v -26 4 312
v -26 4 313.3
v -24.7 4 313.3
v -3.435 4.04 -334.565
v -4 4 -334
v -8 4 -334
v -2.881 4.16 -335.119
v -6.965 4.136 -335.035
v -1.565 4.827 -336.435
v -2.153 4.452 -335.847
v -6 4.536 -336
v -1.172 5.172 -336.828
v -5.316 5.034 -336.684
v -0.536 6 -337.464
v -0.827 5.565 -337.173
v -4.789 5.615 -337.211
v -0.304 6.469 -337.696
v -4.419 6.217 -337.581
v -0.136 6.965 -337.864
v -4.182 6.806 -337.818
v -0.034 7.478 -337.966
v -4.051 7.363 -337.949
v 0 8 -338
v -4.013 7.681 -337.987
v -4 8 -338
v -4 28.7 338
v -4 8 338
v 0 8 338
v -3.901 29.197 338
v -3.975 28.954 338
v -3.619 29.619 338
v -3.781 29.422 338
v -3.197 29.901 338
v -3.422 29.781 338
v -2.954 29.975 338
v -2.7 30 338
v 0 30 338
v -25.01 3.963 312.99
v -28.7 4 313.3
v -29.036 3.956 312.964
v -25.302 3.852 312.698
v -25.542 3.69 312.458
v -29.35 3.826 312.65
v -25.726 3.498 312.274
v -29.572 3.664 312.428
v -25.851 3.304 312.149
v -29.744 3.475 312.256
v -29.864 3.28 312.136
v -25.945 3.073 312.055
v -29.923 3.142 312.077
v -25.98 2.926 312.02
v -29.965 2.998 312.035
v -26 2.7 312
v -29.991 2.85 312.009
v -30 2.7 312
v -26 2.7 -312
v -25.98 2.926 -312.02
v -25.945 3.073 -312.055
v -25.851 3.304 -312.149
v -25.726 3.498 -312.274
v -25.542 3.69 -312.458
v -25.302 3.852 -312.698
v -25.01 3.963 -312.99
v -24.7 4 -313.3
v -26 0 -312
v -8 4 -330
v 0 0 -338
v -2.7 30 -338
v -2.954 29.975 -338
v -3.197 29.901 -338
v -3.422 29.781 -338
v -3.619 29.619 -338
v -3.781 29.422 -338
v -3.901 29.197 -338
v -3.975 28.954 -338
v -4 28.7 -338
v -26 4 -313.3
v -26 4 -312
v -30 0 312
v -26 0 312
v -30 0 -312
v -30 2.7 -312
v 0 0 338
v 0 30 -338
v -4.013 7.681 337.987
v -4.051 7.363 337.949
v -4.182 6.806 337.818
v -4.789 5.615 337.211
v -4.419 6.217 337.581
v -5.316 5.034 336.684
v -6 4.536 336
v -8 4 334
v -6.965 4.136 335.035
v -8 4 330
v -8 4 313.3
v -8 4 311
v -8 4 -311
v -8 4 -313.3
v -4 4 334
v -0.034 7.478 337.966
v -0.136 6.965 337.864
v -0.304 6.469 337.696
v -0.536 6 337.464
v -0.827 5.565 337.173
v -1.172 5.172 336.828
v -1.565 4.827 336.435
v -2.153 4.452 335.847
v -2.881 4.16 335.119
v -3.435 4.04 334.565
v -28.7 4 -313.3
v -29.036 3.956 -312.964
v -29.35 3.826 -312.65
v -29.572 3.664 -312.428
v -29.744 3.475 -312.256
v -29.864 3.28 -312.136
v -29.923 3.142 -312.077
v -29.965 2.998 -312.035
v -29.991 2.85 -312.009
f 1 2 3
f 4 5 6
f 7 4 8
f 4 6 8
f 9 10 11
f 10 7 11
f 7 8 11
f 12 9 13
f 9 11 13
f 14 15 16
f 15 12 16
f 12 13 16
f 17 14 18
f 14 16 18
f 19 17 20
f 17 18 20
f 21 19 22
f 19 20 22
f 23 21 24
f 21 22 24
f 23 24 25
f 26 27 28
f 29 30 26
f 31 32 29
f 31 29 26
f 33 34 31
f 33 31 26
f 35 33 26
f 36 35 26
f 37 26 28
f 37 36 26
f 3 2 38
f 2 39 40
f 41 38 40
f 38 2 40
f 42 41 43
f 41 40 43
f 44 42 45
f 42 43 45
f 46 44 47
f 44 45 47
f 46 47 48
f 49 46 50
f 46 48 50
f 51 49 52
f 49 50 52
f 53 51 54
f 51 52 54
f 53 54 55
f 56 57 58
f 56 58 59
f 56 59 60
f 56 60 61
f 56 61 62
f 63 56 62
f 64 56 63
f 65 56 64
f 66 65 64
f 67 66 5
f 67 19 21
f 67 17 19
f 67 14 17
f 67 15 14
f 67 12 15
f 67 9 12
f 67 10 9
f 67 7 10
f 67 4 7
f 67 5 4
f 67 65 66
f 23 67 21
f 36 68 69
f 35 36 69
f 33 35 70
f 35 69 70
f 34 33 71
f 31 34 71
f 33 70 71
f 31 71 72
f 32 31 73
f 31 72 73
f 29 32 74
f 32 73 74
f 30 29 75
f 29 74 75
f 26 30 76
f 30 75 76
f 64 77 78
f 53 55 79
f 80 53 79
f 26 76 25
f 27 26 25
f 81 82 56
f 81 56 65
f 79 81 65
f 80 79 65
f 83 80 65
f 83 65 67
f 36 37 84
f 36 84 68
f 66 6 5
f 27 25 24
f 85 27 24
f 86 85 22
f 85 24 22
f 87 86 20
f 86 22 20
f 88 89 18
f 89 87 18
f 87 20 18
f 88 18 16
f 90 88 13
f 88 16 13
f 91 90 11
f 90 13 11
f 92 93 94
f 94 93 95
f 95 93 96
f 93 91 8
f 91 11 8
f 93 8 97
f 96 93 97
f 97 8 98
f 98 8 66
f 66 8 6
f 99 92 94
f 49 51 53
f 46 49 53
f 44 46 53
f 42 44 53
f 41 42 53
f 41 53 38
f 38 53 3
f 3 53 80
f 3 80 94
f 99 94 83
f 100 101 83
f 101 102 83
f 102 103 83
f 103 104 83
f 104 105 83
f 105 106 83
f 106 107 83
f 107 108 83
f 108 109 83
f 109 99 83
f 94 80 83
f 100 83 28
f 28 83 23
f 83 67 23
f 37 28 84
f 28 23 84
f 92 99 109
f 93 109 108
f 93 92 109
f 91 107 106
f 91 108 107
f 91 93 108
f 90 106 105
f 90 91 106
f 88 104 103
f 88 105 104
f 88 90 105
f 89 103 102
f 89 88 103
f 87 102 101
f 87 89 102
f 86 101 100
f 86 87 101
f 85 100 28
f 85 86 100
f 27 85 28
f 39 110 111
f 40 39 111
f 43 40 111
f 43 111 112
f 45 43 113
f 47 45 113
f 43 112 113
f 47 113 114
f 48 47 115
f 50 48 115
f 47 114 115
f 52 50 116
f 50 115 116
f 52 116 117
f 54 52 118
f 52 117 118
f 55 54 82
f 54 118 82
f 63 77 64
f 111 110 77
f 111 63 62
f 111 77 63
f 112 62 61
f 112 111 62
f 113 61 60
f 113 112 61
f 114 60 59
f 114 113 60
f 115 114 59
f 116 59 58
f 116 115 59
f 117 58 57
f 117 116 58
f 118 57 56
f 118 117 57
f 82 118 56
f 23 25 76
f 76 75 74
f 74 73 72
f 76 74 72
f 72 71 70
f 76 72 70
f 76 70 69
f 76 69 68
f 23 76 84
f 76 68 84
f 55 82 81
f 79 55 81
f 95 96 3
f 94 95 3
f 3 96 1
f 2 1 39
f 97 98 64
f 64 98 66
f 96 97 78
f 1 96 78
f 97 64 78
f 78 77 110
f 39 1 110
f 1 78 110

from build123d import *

# Parameters (mm, degrees)
EXTRUDE_1_DEPTH = 338
OTHER_START     = -31
OTHER_1_DEPTH   = 5
OTHER_START_2   = -24.7
OTHER_1_2_DEPTH = 20.7
OTHER_START_3   = -1
OTHER_1_3_DEPTH = 5
OTHER_START_4   = 4
OTHER_1_4_DEPTH = 4
OTHER_START_5   = -4
OTHER_1_5_DEPTH = 4
OTHER_START_6   = -26
OTHER_1_6_DEPTH = 18


with BuildPart() as part:
    # Эскиз1 → Бобышка-Вытянуть1 (new body)
    with BuildSketch(Plane.XY):
        with BuildLine():
            Line((0, 0), (0, 30))
            Line((0, 30), (-2.7, 30))
            ThreePointArc((-2.7, 30), (-3.619238816, 29.619238816), (-4, 28.7))
            Line((-4, 28.7), (-4, 8))
            ThreePointArc((-4, 8), (-5.171572875, 5.171572875), (-8, 4))
            Line((-8, 4), (-28.7, 4))
            ThreePointArc((-28.7, 4), (-29.619238816, 3.619238816), (-30, 2.7))
            Line((-30, 2.7), (-30, 0))
            Line((-30, 0), (0, 0))
        make_face()
    extrude(amount=-EXTRUDE_1_DEPTH)

    # Полость1: read off the stored shape, not the designer's step
    # Полость1 outline → Полость1 (cut)
    with BuildSketch(Plane.YZ.offset(OTHER_START)):
        with BuildLine():
            Line((4, -338), (4, -313.3))
            ThreePointArc((4, -313.3), (3.619238816, -312.380761184), (2.7, -312))
            Line((2.7, -312), (0, -312))
            Line((0, -312), (0, -338))
            Line((0, -338), (4, -338))
        make_face()
    extrude(amount=OTHER_1_DEPTH, mode=Mode.SUBTRACT)

    # Other 1 2 outline → Other 1 2 (cut)
    with BuildSketch(Plane.YZ.offset(OTHER_START_2)):
        with BuildLine():
            ThreePointArc((8, -338), (5.171572875, -336.828427125), (4, -334))
            Line((4, -334), (4, -338))
            Line((4, -338), (8, -338))
        make_face()
    extrude(amount=OTHER_1_2_DEPTH, mode=Mode.SUBTRACT)

    # Other 1 3 outline → Other 1 3 (cut)
    with BuildSketch(Plane(origin=(0, 0, 0), x_dir=(1, 0, 0), z_dir=(0, 1, 0)).offset(OTHER_START_3)):
        Polygon((0, 338), (-26, 338), (-26, 312), align=None)
    extrude(amount=OTHER_1_3_DEPTH, mode=Mode.SUBTRACT)

    # Other 1 4 outline → Other 1 4 (cut)
    with BuildSketch(Plane(origin=(0, 0, 0), x_dir=(1, 0, 0), z_dir=(0, 1, 0)).offset(OTHER_START_4)):
        Polygon((-4, 334), (0, 338), (-4, 338), align=None)
    extrude(amount=OTHER_1_4_DEPTH, mode=Mode.SUBTRACT)

    # Other 1 5 outline → Other 1 5 (add)
    with BuildSketch(Plane.YZ.offset(OTHER_START_5)):
        with BuildLine():
            ThreePointArc((4, -334), (5.171572875, -336.828427125), (8, -338))
            Line((8, -338), (8, -311))
            Line((8, -311), (4.000000005, -311))
            Line((4.000000005, -311), (4, -334))
        make_face()
    extrude(amount=OTHER_1_5_DEPTH)

    # Other 1 6 outline → Other 1 6 (add)
    with BuildSketch(Plane.YZ.offset(OTHER_START_6)):
        with BuildLine():
            ThreePointArc((2.7, -312), (3.619238816, -312.380761184), (4, -313.3))
            Line((4, -313.3), (4.000000005, -311))
            Line((4.000000005, -311), (2, -311))
            Line((2, -311), (2, -312.000000001))
            Line((2, -312.000000001), (2.7, -312))
        make_face()
    extrude(amount=OTHER_1_6_DEPTH)

    # Зеркальное отражение1: part across plane


with BuildPart() as part_1:
    add(part.part)
    add(part.part.mirror(Plane(origin=(-2.7, 28.7, 0), x_dir=(1, 0, 0), z_dir=(0, 0, 1))))


solid = part_1.part
